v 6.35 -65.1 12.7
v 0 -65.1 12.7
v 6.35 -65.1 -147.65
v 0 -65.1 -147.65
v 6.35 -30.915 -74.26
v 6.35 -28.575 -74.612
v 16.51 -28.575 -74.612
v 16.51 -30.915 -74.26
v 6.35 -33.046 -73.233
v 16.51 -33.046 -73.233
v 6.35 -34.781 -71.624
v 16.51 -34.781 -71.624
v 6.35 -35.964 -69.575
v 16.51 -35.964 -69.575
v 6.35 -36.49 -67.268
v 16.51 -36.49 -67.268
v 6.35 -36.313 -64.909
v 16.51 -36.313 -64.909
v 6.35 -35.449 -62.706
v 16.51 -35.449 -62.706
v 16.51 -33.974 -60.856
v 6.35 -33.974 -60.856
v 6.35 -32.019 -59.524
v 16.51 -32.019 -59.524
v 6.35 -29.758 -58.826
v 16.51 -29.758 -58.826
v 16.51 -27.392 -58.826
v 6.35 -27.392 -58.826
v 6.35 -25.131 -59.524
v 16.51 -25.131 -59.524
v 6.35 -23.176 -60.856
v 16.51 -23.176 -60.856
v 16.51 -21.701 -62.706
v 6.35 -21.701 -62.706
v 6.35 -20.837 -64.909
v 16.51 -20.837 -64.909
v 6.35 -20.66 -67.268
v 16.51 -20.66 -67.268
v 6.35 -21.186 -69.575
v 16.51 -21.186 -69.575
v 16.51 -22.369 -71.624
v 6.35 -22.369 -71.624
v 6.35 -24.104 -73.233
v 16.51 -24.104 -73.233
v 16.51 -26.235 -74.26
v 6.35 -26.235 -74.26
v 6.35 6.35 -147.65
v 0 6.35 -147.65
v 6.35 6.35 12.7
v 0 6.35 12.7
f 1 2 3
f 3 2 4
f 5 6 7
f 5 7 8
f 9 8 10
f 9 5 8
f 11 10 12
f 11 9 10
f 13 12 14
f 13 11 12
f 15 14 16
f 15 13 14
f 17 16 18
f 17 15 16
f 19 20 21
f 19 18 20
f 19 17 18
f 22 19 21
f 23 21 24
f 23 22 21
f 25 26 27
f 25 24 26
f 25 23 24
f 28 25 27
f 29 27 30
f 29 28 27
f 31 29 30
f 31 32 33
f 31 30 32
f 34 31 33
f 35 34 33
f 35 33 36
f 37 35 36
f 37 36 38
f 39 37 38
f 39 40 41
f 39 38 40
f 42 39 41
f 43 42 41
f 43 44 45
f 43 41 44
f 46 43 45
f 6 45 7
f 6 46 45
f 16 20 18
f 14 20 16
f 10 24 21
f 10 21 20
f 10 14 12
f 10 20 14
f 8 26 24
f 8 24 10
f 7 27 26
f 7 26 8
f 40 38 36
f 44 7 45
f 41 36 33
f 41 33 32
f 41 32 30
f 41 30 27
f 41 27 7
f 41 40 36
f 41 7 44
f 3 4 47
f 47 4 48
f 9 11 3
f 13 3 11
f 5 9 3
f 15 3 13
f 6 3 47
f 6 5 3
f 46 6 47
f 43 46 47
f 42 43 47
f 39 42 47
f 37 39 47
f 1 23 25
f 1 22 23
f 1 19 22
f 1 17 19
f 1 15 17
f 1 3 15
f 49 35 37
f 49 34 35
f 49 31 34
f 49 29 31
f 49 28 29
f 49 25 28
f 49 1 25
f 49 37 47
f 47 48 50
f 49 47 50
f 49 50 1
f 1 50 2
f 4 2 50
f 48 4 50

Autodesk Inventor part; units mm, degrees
ref_plane "YZ Plane" through (0, 0, 0) normal (1, 0, 0) x (0, 1, 0)
ref_plane "XZ Plane" through (0, 0, 0) normal (0, 1, 0) x (-1, 0, 0)
ref_plane "XY Plane" through (0, 0, 0) normal (0, 0, 1) x (1, 0, 0)
sketch "Sketch1" plane through (0, 0, 0) normal (1, 0, 0) x (0, 1, 0)
  line L0 (6.35, 12.7) -> (-65.1002, 12.7)
  line L1 (-65.1002, 12.7) -> (-65.1002, -147.6502)
  line L2 (-65.1002, -147.6502) -> (6.35, -147.6502)
  line L3 (6.35, -147.6502) -> (6.35, 12.7)
  point P0 (0, 0)
  dimension "d0" = 71.4502
  dimension "d1" = 160.3502
extrude "Extrusion1" add sketch "Sketch1" along normal blind 6.35
sketch "Sketch2" plane through (6.35, 0, 0) normal (1, 0, 0) x (0, 0, -1)
  circle A0 centre (66.675, -28.575) radius 7.9375
  point P0 (0, 0)
  dimension "d4" = 15.875
extrude "Extrusion2" add sketch "Sketch2" along normal blind 10.16
properties part number "lid3" material "PMMA Plastic"
